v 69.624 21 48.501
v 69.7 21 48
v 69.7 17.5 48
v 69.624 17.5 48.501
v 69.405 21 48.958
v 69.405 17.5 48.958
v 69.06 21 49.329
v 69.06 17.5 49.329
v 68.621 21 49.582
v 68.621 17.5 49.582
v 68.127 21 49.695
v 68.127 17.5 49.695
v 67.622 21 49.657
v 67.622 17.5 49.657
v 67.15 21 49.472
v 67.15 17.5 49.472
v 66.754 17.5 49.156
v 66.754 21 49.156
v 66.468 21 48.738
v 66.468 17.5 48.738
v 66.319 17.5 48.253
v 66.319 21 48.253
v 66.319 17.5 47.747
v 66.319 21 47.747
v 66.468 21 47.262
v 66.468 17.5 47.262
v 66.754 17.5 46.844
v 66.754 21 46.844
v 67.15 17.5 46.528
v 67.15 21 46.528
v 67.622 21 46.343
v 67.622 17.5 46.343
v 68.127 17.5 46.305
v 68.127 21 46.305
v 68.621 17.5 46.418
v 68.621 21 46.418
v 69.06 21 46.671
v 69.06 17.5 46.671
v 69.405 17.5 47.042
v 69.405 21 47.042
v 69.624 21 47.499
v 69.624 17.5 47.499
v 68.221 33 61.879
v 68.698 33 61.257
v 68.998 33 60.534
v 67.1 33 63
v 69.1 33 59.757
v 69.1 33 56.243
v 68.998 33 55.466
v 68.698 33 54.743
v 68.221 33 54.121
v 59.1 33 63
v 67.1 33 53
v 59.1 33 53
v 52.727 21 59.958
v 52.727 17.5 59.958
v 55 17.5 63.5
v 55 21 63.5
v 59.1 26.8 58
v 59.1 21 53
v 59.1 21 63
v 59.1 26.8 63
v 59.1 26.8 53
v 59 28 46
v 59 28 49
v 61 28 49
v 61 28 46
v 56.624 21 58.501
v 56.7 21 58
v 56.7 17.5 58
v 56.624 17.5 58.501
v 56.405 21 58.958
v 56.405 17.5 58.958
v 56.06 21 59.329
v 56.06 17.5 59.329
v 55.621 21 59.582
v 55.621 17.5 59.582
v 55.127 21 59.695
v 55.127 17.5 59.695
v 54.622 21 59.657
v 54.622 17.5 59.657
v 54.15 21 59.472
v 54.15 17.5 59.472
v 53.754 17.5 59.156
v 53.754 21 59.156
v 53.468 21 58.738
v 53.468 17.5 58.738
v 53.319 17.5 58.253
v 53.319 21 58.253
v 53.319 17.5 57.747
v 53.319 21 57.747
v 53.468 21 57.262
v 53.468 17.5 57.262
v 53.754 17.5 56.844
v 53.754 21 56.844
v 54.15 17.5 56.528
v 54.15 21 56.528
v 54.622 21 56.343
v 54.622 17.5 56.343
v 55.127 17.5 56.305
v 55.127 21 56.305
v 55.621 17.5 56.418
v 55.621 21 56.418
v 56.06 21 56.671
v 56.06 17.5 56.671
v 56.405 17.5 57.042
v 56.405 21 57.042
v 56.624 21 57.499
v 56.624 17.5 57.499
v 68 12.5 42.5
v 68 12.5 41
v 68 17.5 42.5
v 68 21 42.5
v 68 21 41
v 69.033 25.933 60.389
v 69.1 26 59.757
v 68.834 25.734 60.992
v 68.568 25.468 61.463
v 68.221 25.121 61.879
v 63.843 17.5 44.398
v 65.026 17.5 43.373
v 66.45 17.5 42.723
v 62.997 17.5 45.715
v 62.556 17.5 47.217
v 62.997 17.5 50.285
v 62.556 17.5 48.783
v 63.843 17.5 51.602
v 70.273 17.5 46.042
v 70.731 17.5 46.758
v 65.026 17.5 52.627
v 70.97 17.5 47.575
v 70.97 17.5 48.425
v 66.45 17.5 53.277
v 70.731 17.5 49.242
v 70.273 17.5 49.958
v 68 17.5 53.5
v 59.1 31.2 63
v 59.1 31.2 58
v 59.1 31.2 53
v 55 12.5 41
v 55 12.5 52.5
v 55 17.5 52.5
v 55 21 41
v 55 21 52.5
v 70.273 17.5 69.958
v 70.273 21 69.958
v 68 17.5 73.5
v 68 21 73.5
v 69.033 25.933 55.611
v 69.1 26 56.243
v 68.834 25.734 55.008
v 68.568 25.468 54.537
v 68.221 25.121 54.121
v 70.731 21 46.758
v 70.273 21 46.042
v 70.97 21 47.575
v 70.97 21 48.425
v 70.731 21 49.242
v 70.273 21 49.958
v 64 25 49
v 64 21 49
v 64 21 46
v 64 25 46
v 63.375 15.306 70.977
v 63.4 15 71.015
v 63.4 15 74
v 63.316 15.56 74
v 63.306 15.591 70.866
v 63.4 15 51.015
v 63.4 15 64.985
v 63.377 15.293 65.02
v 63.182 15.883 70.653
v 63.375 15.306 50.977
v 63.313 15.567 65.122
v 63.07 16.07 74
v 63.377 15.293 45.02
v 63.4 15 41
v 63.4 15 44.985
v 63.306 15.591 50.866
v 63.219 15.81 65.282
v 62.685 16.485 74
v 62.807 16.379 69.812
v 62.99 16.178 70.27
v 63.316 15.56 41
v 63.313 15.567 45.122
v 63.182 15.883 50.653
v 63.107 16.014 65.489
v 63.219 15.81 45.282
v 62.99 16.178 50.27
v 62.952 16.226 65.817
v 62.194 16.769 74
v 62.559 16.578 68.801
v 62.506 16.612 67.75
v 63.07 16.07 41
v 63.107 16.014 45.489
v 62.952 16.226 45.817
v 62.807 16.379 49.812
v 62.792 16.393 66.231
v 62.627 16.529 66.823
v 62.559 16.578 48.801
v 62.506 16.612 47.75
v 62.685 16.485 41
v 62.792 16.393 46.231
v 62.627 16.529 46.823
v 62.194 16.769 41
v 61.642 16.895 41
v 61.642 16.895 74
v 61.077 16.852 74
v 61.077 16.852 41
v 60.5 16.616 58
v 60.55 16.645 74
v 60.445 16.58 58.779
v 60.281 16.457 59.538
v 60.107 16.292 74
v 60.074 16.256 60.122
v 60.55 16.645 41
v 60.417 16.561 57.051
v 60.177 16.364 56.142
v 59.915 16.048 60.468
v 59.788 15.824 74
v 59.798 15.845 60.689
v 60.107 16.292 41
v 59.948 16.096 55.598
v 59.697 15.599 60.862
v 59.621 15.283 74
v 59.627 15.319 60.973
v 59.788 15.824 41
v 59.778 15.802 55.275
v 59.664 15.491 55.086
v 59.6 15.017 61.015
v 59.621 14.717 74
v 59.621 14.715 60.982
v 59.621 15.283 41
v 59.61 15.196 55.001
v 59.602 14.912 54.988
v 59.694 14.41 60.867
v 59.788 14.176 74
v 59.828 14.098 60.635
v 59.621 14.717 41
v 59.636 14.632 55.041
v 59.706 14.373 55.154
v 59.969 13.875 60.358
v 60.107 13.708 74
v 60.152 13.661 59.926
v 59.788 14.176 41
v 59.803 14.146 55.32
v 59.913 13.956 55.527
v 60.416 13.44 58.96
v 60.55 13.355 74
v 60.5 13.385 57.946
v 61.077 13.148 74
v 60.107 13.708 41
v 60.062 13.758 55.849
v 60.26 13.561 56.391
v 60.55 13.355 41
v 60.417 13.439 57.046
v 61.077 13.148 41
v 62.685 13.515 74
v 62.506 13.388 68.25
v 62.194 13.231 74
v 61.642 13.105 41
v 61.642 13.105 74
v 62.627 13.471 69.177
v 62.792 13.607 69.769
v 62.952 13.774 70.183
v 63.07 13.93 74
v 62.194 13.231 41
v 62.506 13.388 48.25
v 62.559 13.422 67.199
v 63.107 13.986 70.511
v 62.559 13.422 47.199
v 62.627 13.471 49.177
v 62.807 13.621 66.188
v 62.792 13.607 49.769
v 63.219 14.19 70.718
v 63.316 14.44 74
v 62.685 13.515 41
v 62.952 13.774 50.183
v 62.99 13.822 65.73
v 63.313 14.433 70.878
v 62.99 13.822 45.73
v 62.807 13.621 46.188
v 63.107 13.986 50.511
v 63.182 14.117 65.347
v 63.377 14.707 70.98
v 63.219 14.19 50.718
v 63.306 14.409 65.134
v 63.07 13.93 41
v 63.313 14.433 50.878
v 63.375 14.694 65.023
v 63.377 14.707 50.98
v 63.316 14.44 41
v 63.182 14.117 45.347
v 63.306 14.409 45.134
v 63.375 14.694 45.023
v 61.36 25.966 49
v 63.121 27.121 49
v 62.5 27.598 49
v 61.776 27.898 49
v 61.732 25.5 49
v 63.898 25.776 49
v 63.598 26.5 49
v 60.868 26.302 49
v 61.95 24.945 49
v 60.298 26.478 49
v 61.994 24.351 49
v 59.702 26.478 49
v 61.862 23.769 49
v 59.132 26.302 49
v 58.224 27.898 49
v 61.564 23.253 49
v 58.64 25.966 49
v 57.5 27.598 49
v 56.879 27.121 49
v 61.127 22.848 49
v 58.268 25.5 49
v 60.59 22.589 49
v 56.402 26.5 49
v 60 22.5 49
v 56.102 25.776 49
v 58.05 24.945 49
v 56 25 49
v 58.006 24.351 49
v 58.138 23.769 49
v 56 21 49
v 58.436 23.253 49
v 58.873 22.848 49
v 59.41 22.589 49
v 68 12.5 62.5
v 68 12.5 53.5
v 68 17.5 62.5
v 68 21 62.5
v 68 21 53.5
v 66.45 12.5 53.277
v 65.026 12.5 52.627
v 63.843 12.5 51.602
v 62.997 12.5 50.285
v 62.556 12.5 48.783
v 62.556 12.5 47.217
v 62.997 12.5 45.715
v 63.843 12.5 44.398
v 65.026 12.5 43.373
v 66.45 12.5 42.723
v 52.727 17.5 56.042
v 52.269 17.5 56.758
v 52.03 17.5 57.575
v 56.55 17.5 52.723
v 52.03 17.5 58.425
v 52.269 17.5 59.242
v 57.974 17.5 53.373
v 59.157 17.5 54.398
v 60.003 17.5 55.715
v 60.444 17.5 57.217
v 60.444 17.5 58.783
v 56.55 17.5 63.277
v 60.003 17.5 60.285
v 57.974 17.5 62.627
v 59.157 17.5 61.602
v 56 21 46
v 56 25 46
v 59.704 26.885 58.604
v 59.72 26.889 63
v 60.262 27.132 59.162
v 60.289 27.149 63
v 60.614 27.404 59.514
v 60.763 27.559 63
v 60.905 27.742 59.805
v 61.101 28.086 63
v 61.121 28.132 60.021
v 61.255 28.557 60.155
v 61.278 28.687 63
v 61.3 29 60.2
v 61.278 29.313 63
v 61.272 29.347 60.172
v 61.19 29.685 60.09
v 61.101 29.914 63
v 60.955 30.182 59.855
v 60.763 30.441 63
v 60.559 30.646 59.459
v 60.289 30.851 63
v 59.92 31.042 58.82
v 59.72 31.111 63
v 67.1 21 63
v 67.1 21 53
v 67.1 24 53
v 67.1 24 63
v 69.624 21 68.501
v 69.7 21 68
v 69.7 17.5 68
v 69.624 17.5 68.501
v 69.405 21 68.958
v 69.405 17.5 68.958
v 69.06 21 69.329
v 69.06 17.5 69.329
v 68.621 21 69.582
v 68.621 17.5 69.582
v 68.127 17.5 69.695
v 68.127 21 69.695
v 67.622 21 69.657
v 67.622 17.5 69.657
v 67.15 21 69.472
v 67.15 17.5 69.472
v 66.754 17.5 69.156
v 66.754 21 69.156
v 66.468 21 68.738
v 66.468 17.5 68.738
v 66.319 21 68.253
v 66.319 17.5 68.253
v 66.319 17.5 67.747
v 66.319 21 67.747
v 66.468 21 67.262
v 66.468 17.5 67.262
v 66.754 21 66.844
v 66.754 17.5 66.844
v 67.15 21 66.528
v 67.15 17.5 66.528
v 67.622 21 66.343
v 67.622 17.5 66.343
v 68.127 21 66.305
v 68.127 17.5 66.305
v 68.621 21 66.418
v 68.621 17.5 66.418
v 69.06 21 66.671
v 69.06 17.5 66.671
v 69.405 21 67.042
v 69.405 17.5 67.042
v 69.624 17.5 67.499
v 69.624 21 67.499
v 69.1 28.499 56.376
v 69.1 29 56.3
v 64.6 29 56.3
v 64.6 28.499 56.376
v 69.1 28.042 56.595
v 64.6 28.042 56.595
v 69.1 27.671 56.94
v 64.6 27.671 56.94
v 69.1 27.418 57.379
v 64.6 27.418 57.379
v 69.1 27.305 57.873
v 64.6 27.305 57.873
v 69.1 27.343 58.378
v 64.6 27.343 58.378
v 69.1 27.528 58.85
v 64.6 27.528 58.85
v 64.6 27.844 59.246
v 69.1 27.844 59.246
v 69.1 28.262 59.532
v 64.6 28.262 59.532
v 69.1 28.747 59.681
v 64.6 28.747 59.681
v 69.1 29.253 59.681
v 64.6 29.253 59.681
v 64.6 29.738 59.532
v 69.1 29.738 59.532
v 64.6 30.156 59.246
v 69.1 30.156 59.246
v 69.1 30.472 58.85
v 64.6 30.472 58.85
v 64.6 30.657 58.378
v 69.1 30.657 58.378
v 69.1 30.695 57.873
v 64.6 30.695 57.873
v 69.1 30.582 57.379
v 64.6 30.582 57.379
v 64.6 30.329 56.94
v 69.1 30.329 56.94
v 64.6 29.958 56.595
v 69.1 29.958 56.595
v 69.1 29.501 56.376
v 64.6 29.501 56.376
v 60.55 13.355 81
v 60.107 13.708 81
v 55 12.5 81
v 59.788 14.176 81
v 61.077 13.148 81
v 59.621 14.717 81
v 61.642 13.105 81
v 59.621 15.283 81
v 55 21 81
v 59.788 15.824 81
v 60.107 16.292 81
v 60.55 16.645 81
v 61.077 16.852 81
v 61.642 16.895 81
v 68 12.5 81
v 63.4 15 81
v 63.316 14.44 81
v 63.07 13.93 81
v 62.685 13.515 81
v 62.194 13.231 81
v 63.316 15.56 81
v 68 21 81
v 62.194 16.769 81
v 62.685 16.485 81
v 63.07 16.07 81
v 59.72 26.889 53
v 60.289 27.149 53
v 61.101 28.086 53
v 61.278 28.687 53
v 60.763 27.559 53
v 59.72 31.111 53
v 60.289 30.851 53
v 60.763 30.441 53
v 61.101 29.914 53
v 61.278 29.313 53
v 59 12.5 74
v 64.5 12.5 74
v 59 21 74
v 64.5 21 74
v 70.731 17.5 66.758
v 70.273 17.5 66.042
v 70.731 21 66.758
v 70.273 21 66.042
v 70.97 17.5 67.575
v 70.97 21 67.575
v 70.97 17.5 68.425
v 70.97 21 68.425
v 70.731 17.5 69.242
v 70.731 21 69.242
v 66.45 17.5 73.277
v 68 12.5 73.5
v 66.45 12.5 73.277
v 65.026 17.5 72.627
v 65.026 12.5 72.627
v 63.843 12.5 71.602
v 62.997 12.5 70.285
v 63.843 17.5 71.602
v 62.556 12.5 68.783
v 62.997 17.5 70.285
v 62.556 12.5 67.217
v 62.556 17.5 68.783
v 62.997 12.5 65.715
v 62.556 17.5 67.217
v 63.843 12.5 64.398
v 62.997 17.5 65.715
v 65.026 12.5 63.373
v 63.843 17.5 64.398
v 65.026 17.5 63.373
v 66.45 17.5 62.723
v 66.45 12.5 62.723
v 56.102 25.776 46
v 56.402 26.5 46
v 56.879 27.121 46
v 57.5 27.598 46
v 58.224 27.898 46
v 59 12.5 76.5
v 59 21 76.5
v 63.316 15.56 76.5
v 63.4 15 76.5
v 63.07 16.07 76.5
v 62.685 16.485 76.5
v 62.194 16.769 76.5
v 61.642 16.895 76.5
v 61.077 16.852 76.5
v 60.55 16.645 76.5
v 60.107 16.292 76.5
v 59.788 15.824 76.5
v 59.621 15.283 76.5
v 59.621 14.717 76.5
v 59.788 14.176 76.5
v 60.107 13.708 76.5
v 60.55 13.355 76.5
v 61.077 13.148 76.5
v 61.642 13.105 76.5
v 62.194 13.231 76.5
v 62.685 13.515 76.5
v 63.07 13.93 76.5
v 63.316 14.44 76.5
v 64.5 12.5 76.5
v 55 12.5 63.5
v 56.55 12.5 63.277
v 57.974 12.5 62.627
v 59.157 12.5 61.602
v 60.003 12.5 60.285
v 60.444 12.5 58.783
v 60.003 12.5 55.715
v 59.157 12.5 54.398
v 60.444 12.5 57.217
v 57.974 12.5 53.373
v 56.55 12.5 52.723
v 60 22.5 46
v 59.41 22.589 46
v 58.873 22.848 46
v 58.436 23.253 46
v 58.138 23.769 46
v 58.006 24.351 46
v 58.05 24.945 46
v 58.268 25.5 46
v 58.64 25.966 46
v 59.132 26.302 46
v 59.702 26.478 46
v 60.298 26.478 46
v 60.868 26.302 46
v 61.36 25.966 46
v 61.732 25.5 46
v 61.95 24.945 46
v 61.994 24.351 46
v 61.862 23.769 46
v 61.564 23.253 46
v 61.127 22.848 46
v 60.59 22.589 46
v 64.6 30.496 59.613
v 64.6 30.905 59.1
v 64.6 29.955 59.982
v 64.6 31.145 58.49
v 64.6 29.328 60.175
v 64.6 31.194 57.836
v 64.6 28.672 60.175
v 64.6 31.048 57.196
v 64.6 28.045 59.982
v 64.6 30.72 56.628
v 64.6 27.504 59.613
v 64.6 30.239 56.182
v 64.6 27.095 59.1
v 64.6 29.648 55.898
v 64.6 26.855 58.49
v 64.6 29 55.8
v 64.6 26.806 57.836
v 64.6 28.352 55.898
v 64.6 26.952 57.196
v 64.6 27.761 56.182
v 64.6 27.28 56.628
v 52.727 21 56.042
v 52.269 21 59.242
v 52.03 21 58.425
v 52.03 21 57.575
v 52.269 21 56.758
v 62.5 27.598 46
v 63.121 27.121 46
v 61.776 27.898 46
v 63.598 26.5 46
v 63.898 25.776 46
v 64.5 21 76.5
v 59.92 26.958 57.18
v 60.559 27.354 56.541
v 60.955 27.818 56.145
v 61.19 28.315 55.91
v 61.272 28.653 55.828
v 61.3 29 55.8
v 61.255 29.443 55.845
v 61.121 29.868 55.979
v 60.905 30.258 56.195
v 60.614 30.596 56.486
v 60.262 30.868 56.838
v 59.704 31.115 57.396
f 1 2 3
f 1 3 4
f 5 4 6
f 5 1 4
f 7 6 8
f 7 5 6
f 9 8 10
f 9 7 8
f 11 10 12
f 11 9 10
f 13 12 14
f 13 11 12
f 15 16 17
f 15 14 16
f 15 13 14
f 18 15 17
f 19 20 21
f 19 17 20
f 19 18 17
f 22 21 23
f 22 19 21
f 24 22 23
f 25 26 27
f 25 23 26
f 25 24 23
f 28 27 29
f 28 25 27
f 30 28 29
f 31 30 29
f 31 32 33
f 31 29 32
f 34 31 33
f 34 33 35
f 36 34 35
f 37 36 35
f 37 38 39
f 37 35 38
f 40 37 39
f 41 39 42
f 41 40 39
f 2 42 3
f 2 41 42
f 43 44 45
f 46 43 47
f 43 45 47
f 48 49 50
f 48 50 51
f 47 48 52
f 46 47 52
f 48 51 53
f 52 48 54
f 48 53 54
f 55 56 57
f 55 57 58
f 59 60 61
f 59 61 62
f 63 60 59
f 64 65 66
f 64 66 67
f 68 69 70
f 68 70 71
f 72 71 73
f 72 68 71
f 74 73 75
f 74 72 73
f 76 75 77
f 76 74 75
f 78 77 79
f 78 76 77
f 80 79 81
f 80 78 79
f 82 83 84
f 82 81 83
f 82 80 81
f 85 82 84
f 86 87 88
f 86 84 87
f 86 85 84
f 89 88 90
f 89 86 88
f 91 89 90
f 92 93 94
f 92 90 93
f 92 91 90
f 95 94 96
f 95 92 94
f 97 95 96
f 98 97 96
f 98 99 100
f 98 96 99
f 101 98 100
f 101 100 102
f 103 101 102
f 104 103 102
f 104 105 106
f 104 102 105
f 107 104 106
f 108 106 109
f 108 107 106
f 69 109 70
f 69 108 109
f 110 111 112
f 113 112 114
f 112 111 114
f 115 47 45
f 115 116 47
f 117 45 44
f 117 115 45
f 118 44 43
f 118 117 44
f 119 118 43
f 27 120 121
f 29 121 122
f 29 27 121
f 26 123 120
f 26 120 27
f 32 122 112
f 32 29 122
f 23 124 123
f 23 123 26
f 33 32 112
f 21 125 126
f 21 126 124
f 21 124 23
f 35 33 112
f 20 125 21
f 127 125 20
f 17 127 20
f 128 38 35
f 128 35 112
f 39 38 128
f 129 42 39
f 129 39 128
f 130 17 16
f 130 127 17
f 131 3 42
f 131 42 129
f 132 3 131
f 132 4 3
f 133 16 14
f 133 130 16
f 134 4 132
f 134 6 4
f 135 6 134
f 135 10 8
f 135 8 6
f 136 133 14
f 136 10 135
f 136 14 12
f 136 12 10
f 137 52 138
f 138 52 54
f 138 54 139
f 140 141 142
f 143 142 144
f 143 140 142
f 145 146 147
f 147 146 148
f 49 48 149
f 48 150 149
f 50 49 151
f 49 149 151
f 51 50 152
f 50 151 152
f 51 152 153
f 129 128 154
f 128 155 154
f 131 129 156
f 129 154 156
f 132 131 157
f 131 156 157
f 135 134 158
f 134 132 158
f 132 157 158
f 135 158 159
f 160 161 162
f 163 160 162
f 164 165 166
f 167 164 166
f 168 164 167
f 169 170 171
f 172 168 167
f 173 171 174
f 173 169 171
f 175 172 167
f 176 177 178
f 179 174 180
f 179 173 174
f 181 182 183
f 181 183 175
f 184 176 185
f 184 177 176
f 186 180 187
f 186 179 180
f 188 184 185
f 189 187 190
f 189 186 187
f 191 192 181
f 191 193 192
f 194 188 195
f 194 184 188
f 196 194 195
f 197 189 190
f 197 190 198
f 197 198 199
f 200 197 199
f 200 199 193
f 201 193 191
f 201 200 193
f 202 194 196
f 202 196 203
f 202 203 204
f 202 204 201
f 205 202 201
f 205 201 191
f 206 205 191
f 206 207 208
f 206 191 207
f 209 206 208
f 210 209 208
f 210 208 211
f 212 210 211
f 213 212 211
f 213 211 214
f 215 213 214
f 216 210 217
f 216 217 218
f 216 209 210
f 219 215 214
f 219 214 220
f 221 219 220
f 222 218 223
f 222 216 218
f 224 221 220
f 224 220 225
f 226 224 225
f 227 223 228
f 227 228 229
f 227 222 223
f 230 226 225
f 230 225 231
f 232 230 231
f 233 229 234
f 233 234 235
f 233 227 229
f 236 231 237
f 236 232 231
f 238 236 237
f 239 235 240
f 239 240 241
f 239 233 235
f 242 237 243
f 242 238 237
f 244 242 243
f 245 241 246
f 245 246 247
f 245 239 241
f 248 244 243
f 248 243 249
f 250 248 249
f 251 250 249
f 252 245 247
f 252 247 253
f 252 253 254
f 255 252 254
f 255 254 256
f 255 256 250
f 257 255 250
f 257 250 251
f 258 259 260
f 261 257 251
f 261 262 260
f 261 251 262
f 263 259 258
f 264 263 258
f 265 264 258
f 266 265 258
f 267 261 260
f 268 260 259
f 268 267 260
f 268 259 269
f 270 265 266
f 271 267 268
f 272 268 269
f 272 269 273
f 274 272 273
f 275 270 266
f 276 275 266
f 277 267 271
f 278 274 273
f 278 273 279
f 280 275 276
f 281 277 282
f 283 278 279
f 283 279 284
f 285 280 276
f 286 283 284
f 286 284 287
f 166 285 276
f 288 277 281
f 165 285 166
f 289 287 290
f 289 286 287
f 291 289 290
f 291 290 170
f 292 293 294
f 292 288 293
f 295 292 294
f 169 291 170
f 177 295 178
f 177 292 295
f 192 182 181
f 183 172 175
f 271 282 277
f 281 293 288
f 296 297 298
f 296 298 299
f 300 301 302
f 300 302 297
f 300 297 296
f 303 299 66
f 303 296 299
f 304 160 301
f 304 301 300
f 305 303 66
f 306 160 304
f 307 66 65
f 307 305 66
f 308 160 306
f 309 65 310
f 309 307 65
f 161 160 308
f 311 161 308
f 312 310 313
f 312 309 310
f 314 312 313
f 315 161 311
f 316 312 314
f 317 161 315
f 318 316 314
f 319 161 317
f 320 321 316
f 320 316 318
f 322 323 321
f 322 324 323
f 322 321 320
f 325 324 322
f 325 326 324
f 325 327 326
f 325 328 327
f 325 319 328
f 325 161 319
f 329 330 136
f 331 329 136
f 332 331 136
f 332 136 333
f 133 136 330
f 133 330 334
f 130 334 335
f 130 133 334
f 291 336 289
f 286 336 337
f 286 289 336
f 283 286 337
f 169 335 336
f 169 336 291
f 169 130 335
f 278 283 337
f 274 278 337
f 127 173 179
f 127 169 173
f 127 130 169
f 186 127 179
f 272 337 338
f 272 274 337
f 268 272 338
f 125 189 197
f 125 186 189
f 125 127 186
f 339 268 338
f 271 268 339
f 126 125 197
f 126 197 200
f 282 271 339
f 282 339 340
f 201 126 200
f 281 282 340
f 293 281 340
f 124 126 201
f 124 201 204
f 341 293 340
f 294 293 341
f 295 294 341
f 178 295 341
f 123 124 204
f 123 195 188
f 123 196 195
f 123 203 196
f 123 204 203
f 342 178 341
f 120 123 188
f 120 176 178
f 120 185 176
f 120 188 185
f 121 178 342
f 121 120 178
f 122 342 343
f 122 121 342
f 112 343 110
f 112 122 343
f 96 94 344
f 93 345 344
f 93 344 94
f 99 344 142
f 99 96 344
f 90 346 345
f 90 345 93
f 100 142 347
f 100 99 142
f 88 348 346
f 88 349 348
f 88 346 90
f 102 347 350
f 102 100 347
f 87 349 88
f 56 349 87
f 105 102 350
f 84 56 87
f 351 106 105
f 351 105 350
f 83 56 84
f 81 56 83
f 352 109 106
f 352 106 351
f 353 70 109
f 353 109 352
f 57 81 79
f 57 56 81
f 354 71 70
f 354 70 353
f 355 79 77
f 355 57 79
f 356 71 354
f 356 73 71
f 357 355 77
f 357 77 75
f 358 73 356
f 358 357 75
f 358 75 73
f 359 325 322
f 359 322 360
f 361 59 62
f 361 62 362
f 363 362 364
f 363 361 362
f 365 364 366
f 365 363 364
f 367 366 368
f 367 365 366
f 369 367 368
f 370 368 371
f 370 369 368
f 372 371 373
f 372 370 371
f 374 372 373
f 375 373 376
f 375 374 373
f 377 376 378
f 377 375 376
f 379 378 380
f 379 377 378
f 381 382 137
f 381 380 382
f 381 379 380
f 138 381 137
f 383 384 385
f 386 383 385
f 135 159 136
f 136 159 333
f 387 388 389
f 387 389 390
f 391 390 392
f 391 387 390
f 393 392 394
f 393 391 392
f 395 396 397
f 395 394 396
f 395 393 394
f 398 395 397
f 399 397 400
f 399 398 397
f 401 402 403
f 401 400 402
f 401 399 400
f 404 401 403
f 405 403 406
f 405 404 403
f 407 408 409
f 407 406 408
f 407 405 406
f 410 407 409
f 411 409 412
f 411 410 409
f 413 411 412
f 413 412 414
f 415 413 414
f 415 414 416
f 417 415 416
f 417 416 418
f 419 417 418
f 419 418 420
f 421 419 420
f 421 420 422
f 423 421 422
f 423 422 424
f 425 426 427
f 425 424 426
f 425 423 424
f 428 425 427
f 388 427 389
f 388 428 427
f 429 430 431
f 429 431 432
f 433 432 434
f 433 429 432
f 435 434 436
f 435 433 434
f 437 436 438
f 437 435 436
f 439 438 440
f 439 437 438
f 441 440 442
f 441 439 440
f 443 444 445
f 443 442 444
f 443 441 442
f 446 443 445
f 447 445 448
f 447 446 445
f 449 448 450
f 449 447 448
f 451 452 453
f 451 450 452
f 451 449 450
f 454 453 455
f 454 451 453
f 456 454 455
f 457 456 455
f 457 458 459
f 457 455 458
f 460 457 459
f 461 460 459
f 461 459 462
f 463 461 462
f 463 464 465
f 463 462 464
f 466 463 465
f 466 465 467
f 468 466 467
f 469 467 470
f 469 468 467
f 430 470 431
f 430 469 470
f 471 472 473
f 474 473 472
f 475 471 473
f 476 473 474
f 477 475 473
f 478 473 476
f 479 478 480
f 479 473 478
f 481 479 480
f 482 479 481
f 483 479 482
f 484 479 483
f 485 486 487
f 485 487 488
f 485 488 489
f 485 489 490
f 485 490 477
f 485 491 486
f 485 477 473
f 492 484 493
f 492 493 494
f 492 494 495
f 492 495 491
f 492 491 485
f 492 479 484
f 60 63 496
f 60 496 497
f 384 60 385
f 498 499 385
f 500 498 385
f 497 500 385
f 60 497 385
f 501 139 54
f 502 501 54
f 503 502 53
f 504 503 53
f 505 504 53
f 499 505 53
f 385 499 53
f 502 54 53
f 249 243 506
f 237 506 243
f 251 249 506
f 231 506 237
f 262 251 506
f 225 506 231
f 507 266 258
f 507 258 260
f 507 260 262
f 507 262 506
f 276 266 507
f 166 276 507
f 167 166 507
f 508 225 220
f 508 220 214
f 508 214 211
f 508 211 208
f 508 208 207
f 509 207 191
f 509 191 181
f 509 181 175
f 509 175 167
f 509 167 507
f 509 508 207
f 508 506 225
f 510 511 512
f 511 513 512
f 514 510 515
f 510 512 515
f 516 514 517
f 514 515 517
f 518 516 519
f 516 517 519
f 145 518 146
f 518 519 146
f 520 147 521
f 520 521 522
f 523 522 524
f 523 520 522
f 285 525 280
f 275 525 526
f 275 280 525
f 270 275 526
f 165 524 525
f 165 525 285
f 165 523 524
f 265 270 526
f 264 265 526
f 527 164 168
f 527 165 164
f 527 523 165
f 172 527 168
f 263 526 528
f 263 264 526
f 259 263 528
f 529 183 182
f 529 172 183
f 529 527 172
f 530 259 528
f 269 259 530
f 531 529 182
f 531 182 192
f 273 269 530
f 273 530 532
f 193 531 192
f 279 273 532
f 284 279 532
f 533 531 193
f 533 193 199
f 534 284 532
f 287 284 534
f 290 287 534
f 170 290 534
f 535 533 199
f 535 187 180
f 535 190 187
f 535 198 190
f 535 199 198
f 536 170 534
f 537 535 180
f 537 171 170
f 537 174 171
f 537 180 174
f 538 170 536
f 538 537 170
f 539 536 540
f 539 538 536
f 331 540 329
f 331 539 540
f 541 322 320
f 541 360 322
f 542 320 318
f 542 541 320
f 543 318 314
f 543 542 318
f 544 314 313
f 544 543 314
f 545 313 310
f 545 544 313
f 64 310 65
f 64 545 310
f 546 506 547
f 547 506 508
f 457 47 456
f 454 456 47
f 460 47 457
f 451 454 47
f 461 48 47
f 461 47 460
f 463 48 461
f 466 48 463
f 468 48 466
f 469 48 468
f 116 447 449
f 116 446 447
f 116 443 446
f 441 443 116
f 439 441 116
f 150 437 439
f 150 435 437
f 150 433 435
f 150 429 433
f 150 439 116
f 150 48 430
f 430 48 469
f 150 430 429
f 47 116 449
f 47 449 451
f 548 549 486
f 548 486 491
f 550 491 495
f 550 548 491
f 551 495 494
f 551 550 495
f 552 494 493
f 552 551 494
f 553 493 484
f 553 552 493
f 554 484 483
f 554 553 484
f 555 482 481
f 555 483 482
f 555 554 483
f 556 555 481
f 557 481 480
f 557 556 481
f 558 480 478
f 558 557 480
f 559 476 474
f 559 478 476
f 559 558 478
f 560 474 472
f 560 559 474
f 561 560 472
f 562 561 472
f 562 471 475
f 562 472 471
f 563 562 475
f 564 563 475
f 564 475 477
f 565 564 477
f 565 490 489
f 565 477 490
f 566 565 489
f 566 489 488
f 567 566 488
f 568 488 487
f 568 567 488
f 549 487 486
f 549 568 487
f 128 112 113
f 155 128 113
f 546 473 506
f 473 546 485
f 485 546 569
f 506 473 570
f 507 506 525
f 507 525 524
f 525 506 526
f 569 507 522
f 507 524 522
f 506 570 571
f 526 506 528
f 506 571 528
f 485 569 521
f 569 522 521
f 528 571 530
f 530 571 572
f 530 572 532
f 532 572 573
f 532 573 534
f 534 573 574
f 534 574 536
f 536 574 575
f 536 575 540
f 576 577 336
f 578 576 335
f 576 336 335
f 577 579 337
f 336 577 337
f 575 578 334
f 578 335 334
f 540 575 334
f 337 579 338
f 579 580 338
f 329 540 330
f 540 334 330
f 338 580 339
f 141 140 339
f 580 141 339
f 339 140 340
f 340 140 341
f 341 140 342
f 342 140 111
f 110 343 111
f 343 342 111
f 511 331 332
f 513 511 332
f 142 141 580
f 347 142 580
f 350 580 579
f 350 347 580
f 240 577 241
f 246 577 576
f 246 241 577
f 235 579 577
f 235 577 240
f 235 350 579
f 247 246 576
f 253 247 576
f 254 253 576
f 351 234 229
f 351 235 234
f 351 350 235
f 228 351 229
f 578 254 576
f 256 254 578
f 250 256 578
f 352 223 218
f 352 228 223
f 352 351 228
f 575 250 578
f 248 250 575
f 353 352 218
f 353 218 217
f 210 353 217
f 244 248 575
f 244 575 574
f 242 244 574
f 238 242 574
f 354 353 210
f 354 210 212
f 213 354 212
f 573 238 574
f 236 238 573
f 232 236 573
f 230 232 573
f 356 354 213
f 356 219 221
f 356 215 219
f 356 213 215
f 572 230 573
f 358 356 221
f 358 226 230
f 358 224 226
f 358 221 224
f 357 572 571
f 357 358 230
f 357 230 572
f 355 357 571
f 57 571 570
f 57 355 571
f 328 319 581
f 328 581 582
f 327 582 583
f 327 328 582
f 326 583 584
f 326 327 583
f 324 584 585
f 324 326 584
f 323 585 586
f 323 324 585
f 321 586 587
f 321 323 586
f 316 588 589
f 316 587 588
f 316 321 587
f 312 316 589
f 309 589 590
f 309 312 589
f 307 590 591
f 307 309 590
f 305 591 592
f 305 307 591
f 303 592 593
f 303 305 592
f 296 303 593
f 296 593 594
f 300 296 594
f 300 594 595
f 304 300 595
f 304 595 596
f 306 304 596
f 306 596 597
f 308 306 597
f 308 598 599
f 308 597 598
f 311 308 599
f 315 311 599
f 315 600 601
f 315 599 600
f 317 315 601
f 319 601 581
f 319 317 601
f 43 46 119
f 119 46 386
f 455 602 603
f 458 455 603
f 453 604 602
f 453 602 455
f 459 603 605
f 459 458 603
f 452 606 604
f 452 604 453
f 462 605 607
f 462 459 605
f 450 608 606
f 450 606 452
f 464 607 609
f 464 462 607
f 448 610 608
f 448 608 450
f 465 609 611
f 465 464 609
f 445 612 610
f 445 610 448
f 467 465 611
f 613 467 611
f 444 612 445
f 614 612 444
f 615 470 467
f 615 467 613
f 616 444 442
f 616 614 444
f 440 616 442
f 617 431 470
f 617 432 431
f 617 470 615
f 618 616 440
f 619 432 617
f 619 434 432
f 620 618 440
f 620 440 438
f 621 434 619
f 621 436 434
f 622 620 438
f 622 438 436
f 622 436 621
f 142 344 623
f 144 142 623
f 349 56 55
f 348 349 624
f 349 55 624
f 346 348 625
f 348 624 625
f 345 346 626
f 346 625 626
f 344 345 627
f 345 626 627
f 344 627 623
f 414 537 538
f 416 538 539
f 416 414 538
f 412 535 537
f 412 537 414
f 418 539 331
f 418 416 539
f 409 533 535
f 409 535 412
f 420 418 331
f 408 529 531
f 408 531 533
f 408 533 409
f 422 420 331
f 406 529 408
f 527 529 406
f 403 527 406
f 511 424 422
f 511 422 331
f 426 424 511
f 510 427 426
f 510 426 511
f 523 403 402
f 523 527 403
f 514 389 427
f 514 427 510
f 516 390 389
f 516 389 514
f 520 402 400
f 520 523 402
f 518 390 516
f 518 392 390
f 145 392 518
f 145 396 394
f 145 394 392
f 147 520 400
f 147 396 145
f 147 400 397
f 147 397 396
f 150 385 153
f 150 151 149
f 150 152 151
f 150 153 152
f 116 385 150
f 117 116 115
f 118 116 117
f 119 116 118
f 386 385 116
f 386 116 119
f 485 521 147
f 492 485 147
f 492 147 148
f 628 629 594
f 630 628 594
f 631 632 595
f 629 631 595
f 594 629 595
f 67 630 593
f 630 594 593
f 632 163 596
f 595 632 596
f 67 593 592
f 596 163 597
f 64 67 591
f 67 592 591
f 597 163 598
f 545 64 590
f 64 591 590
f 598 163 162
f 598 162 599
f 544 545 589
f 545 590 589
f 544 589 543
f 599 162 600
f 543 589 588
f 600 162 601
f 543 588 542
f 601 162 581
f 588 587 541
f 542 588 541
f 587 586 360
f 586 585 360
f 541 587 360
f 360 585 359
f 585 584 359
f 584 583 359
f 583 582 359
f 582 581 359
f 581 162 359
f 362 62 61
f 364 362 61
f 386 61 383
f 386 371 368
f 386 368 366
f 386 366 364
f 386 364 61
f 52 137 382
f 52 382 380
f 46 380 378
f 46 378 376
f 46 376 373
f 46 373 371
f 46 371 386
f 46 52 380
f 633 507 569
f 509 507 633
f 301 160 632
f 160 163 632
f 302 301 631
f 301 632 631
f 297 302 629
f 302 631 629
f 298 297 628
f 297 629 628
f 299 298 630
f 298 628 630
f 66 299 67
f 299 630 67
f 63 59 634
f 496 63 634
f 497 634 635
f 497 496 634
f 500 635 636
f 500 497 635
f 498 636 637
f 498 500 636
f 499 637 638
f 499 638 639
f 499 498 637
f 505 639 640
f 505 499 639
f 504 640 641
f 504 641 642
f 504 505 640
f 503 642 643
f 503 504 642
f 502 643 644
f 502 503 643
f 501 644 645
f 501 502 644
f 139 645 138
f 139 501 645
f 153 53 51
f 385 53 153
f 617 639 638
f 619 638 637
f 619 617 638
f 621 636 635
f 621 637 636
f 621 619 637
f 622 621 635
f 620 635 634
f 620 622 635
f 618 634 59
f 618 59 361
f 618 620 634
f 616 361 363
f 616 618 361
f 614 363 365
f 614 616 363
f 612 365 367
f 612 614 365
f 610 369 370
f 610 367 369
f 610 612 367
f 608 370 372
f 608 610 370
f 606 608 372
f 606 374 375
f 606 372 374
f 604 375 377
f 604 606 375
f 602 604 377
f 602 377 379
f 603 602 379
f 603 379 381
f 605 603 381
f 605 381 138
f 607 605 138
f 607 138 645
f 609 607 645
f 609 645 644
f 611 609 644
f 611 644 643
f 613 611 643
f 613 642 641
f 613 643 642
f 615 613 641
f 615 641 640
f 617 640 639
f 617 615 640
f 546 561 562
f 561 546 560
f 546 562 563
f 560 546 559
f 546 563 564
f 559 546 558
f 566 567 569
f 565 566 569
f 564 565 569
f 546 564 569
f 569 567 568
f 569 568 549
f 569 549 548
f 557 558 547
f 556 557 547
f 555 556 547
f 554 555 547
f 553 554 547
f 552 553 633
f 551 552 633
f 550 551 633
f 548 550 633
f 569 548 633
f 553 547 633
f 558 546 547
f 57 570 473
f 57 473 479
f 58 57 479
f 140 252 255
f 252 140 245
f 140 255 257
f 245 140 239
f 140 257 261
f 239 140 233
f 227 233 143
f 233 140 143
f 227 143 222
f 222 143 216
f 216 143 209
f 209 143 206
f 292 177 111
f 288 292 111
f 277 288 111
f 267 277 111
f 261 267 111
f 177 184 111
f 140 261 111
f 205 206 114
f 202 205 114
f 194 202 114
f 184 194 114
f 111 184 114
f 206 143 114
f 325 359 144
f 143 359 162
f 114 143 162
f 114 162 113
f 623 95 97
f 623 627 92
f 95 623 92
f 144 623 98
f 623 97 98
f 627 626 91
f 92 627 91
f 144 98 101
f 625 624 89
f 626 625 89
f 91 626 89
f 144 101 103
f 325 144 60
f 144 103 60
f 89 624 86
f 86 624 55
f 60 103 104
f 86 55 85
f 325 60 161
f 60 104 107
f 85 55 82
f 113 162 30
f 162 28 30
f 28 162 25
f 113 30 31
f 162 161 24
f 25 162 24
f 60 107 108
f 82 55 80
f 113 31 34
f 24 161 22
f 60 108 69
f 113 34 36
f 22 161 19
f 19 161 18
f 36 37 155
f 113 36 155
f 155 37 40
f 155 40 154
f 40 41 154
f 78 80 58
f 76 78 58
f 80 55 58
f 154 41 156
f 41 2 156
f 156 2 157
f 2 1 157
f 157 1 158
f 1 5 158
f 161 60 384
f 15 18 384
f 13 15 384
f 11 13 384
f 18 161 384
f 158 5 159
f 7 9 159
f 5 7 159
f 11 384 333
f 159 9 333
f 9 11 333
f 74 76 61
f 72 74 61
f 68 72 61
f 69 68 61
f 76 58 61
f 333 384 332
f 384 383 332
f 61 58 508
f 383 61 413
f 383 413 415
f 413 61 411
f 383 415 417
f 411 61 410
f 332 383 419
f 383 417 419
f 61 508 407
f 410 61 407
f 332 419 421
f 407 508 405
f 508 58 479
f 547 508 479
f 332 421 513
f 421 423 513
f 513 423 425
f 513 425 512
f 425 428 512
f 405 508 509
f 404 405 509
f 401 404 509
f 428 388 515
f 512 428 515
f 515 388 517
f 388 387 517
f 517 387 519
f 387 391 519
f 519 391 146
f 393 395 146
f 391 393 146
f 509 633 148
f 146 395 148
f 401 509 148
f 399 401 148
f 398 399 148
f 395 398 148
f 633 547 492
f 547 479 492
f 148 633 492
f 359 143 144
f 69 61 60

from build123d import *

# Parameters (mm, degrees)
BOX001027045206_W       = 8
BOX001027045206_H       = 6
BOX001027045206_DEPTH   = 10
CYLINDER272_R           = 2.2
CYLINDER272_DEPTH       = 30
CYLINDER271_R           = 2.2
CYLINDER271_DEPTH       = 30
CYLINDER271_PITCH_ANGLE = 90
CYLINDER270_R           = 1.7
CYLINDER270_DEPTH       = 30
CYLINDER270_PITCH_ANGLE = 90
BOX001027045200_W       = 10
BOX001027045200_H       = 9
BOX001027045200_DEPTH   = 10
CHAMFER015_SIZE         = 2
CHAMFER016_SIZE         = 2
FILLET046_R             = 3
CYLINDER045_R           = 1.9
CYLINDER045_DEPTH       = 200
BOX030_W                = 5.5
BOX030_H                = 10
BOX030_DEPTH            = 2.5
CYLINDER048_R           = 5.5
CYLINDER048_DEPTH       = 10
CYLINDER048_ROLL_ANGLE  = 90
CYLINDER050_R           = 5.5
CYLINDER050_DEPTH       = 10
CYLINDER050_ROLL_ANGLE  = 90
CYLINDER052_R           = 1.7
CYLINDER052_DEPTH       = 30
CYLINDER052_ROLL_ANGLE  = 90
CYLINDER053_R           = 1.7
CYLINDER053_DEPTH       = 30
CYLINDER053_ROLL_ANGLE  = 90
CYLINDER054_R           = 1.7
CYLINDER054_DEPTH       = 30
CYLINDER054_ROLL_ANGLE  = 90
CYLINDER047_R           = 5.5
CYLINDER047_DEPTH       = 10
CYLINDER047_ROLL_ANGLE  = 90
CYLINDER049_R           = 3
CYLINDER049_DEPTH       = 10
CYLINDER049_ROLL_ANGLE  = 90
CYLINDER051_R           = 3
CYLINDER051_DEPTH       = 10
CYLINDER051_ROLL_ANGLE  = 90
CYLINDER046_R           = 3
CYLINDER046_DEPTH       = 10
CYLINDER046_ROLL_ANGLE  = 90
BOX028_W                = 13
BOX028_H                = 8.5
BOX028_DEPTH            = 40
CHAMFER006_SIZE         = 2.5
CYLINDER273_R           = 2
CYLINDER273_DEPTH       = 10
CYLINDER273_PITCH_ANGLE = 90
BOX001027045201_W       = 3
BOX001027045201_H       = 8
BOX001027045201_DEPTH   = 8
FILLET047_R             = 3
CUT247_PITCH_ANGLE      = 90
CUT247_PLACEMENT_ANGLE  = 90


with BuildPart() as cube252:
    # Box001027045206 → Box001027045206 (new body)
    with BuildSketch(Plane(origin=(59.1, 20, 53), x_dir=(1, 0, 0), z_dir=(0, 0, 1))):
        with Locations((4, 3)):
            Rectangle(BOX001027045206_W, BOX001027045206_H)
    extrude(amount=BOX001027045206_DEPTH)


with BuildPart() as cylinder288:
    # Cylinder272 → Cylinder272 (new body)
    with BuildSketch(Plane(origin=(79.5, 5, 48), x_dir=(1, 0, 0), z_dir=(0, 0, 1))):
        Circle(CYLINDER272_R)
    extrude(amount=CYLINDER272_DEPTH)


with BuildPart() as cylinder287:
    # Cylinder271 → Cylinder271 (new body)
    with BuildSketch(Plane.XY):
        Circle(CYLINDER271_R)
    extrude(amount=CYLINDER271_DEPTH)


with BuildPart() as cylinder287_1:
    # Cylinder271 pitch: moved
    add(cylinder287.part.rotate(Axis((0, 0, 0), (0, 1, 0)), CYLINDER271_PITCH_ANGLE))


with BuildPart() as cylinder287_2:
    # Cylinder271 placement: moved
    add(cylinder287_1.part.moved(Location((74, 5, 58))))


with BuildPart() as cylinder286:
    # Cylinder270 → Cylinder270 (new body)
    with BuildSketch(Plane.XY):
        Circle(CYLINDER270_R)
    extrude(amount=CYLINDER270_DEPTH)


with BuildPart() as cylinder286_1:
    # Cylinder270 pitch: moved
    add(cylinder286.part.rotate(Axis((0, 0, 0), (0, 1, 0)), CYLINDER270_PITCH_ANGLE))


with BuildPart() as cylinder286_2:
    # Cylinder270 placement: moved
    add(cylinder286_1.part.moved(Location((57, 5, 58))))


with BuildPart() as led_pt_holder001:
    # Box001027045200 → Box001027045200 (new body)
    with BuildSketch(Plane(origin=(71, 1, 53), x_dir=(1, 0, 0), z_dir=(0, 0, 1))):
        with Locations((5, 4.5)):
            Rectangle(BOX001027045200_W, BOX001027045200_H)
    extrude(amount=BOX001027045200_DEPTH)

    # Chamfer015
    chamfer015_edges = [led_pt_holder001.edges().sort_by_distance(p)[0] for p in [
        (71, 10, 58),
    ]]
    chamfer(chamfer015_edges, length=CHAMFER015_SIZE)


with BuildPart() as led_pt_holder001_1:
    # Chamfer015 placement: moved
    add(led_pt_holder001.part.moved(Location((-1.5, 0, 0))))

    # Chamfer016
    chamfer016_edges = [led_pt_holder001_1.edges().sort_by_distance(p)[0] for p in [
        (69.5, 4.5, 63),
        (69.5, 4.5, 53),
    ]]
    chamfer(chamfer016_edges, length=CHAMFER016_SIZE)

    # Cut242: cut Cylinder286
    add(cylinder286_2.part, mode=Mode.SUBTRACT)

    # Cut243: cut Cylinder287
    add(cylinder287_2.part, mode=Mode.SUBTRACT)

    # Fillet046
    fillet046_edges = [led_pt_holder001_1.edges().sort_by_distance(p)[0] for p in [
        (69.5, 4.5, 55),
        (69.5, 4.5, 61),
    ]]
    fillet(fillet046_edges, radius=FILLET046_R)

    # Cut245: cut Cylinder288
    add(cylinder288.part, mode=Mode.SUBTRACT)


with BuildPart() as part_mirroring015:
    # Part__Mirroring015: instance of led-pt-holder001
    add(led_pt_holder001_1.part.mirror(Plane(origin=(60, 0, 0), x_dir=(0, -1, 0), z_dir=(1, 0, 0))))


with BuildPart() as part_mirroring015_1:
    # Part__Mirroring015 placement: moved
    add(part_mirroring015.part.moved(Location((18.6, 0, 0))))


with BuildPart() as pt_holder:
    # Part__Mirroring019: instance of Part__Mirroring015
    add(part_mirroring015_1.part.mirror(Plane(origin=(0, 0, 0), x_dir=(1, 0, 0), z_dir=(0, 1, 0))))


with BuildPart() as pt_holder_1:
    # Part__Mirroring019 placement: moved
    add(pt_holder.part.moved(Location((0, 34, 0))))

    # Fusion112161: union Cube252
    add(cube252.part)


with BuildPart() as m3_studding004:
    # Cylinder045 → Cylinder045 (new body)
    with BuildSketch(Plane(origin=(61.5, 15, 2), x_dir=(1, 0, 0), z_dir=(0, 0, 1))):
        Circle(CYLINDER045_R)
    extrude(amount=CYLINDER045_DEPTH)


with BuildPart() as m3_nut_hole:
    # Box030 → Box030 (new body)
    with BuildSketch(Plane(origin=(59, 11.7, 74), x_dir=(1, 0, 0), z_dir=(0, 0, 1))):
        with Locations((2.75, 5)):
            Rectangle(BOX030_W, BOX030_H)
    extrude(amount=BOX030_DEPTH)


with BuildPart() as cylinder088:
    # Cylinder048 → Cylinder048 (new body)
    with BuildSketch(Plane.XY):
        Circle(CYLINDER048_R)
    extrude(amount=CYLINDER048_DEPTH)


with BuildPart() as cylinder088_1:
    # Cylinder048 roll: moved
    add(cylinder088.part.rotate(Axis((0, 0, 0), (1, 0, 0)), CYLINDER048_ROLL_ANGLE))


with BuildPart() as cylinder088_2:
    # Cylinder048 placement: moved
    add(cylinder088_1.part.moved(Location((68, 17.5, 68))))


with BuildPart() as cylinder090:
    # Cylinder050 → Cylinder050 (new body)
    with BuildSketch(Plane.XY):
        Circle(CYLINDER050_R)
    extrude(amount=CYLINDER050_DEPTH)


with BuildPart() as cylinder090_1:
    # Cylinder050 roll: moved
    add(cylinder090.part.rotate(Axis((0, 0, 0), (1, 0, 0)), CYLINDER050_ROLL_ANGLE))


with BuildPart() as cylinder090_2:
    # Cylinder050 placement: moved
    add(cylinder090_1.part.moved(Location((68, 17.5, 48))))


with BuildPart() as cylinder092:
    # Cylinder052 → Cylinder052 (new body)
    with BuildSketch(Plane.XY):
        Circle(CYLINDER052_R)
    extrude(amount=CYLINDER052_DEPTH)


with BuildPart() as cylinder092_1:
    # Cylinder052 roll: moved
    add(cylinder092.part.rotate(Axis((0, 0, 0), (1, 0, 0)), CYLINDER052_ROLL_ANGLE))


with BuildPart() as cylinder092_2:
    # Cylinder052 placement: moved
    add(cylinder092_1.part.moved(Location((68, 26, 48))))


with BuildPart() as cylinder052:
    # Cylinder053 → Cylinder053 (new body)
    with BuildSketch(Plane.XY):
        Circle(CYLINDER053_R)
    extrude(amount=CYLINDER053_DEPTH)


with BuildPart() as cylinder052_1:
    # Cylinder053 roll: moved
    add(cylinder052.part.rotate(Axis((0, 0, 0), (1, 0, 0)), CYLINDER053_ROLL_ANGLE))


with BuildPart() as cylinder052_2:
    # Cylinder053 placement: moved
    add(cylinder052_1.part.moved(Location((68, 27, 68))))


with BuildPart() as cylinder093:
    # Cylinder054 → Cylinder054 (new body)
    with BuildSketch(Plane.XY):
        Circle(CYLINDER054_R)
    extrude(amount=CYLINDER054_DEPTH)


with BuildPart() as cylinder093_1:
    # Cylinder054 roll: moved
    add(cylinder093.part.rotate(Axis((0, 0, 0), (1, 0, 0)), CYLINDER054_ROLL_ANGLE))


with BuildPart() as cylinder093_2:
    # Cylinder054 placement: moved
    add(cylinder093_1.part.moved(Location((55, 26, 58))))


with BuildPart() as trolley_clearances_and_screws:
    # Cylinder047 → Cylinder047 (new body)
    with BuildSketch(Plane.XY):
        Circle(CYLINDER047_R)
    extrude(amount=CYLINDER047_DEPTH)


with BuildPart() as trolley_clearances_and_screws_1:
    # Cylinder047 roll: moved
    add(trolley_clearances_and_screws.part.rotate(Axis((0, 0, 0), (1, 0, 0)), CYLINDER047_ROLL_ANGLE))


with BuildPart() as trolley_clearances_and_screws_2:
    # Cylinder047 placement: moved
    add(trolley_clearances_and_screws_1.part.moved(Location((55, 17.5, 58))))

    # Fusion028: union Cylinder088, Cylinder090, Cylinder092, Cylinder052, Cylinder093
    add(cylinder088_2.part)
    add(cylinder090_2.part)
    add(cylinder092_2.part)
    add(cylinder052_2.part)
    add(cylinder093_2.part)


with BuildPart() as cylinder089:
    # Cylinder049 → Cylinder049 (new body)
    with BuildSketch(Plane.XY):
        Circle(CYLINDER049_R)
    extrude(amount=CYLINDER049_DEPTH)


with BuildPart() as cylinder089_1:
    # Cylinder049 roll: moved
    add(cylinder089.part.rotate(Axis((0, 0, 0), (1, 0, 0)), CYLINDER049_ROLL_ANGLE))


with BuildPart() as cylinder089_2:
    # Cylinder049 placement: moved
    add(cylinder089_1.part.moved(Location((68, 21, 68))))


with BuildPart() as cylinder091:
    # Cylinder051 → Cylinder051 (new body)
    with BuildSketch(Plane.XY):
        Circle(CYLINDER051_R)
    extrude(amount=CYLINDER051_DEPTH)


with BuildPart() as cylinder091_1:
    # Cylinder051 roll: moved
    add(cylinder091.part.rotate(Axis((0, 0, 0), (1, 0, 0)), CYLINDER051_ROLL_ANGLE))


with BuildPart() as cylinder091_2:
    # Cylinder051 placement: moved
    add(cylinder091_1.part.moved(Location((68, 21, 48))))


with BuildPart() as trolley_hubs:
    # Cylinder046 → Cylinder046 (new body)
    with BuildSketch(Plane.XY):
        Circle(CYLINDER046_R)
    extrude(amount=CYLINDER046_DEPTH)


with BuildPart() as trolley_hubs_1:
    # Cylinder046 roll: moved
    add(trolley_hubs.part.rotate(Axis((0, 0, 0), (1, 0, 0)), CYLINDER046_ROLL_ANGLE))


with BuildPart() as trolley_hubs_2:
    # Cylinder046 placement: moved
    add(trolley_hubs_1.part.moved(Location((55, 21, 58))))

    # Fusion027: union Cylinder089, Cylinder091
    add(cylinder089_2.part)
    add(cylinder091_2.part)


with BuildPart() as trolley_b001:
    # Box028 → Box028 (new body)
    with BuildSketch(Plane(origin=(55, 12.5, 41), x_dir=(1, 0, 0), z_dir=(0, 0, 1))):
        with Locations((6.5, 4.25)):
            Rectangle(BOX028_W, BOX028_H)
    extrude(amount=BOX028_DEPTH)

    # Fusion029: union trolley-hubs
    add(trolley_hubs_2.part)

    # Cut017: cut trolley-clearances-and-screws
    add(trolley_clearances_and_screws_2.part, mode=Mode.SUBTRACT)

    # Cut019: cut M3-nut-hole
    add(m3_nut_hole.part, mode=Mode.SUBTRACT)

    # Chamfer006
    chamfer006_edges = [trolley_b001.edges().sort_by_distance(p)[0] for p in [
        (55, 19.25, 55),
        (68, 19.25, 45),
        (55, 19.25, 61),
        (68, 19.25, 65),
        (68, 19.25, 51),
        (68, 19.25, 71),
    ]]
    chamfer(chamfer006_edges, length=CHAMFER006_SIZE)

    # Cut033: cut m3-studding004
    add(m3_studding004.part, mode=Mode.SUBTRACT)


with BuildPart() as cylinder289:
    # Cylinder273 → Cylinder273 (new body)
    with BuildSketch(Plane.XY):
        Circle(CYLINDER273_R)
    extrude(amount=CYLINDER273_DEPTH)


with BuildPart() as cylinder289_1:
    # Cylinder273 pitch: moved
    add(cylinder289.part.rotate(Axis((0, 0, 0), (0, 1, 0)), CYLINDER273_PITCH_ANGLE))


with BuildPart() as cylinder289_2:
    # Cylinder273 placement: moved
    add(cylinder289_1.part.moved(Location((-3, 4, 4.5))))


with BuildPart() as trolley:
    # Box001027045201 → Box001027045201 (new body)
    with BuildSketch(Plane.XY):
        with Locations((1.5, 4)):
            Rectangle(BOX001027045201_W, BOX001027045201_H)
    extrude(amount=BOX001027045201_DEPTH)

    # Fillet047
    fillet047_edges = [trolley.edges().sort_by_distance(p)[0] for p in [
        (1.5, 0, 8),
        (1.5, 8, 8),
    ]]
    fillet(fillet047_edges, radius=FILLET047_R)

    # Cut247: cut Cylinder289
    add(cylinder289_2.part, mode=Mode.SUBTRACT)


with BuildPart() as trolley_1:
    # Cut247 pitch: moved
    add(trolley.part.rotate(Axis((0, 0, 0), (0, 1, 0)), CUT247_PITCH_ANGLE))


with BuildPart() as trolley_2:
    # Cut247 placement: moved
    add(trolley_1.part.moved(Location((64, 20, 49))).rotate(Axis((64, 20, 49), (0, 0, 1)), CUT247_PLACEMENT_ANGLE))

    # Fusion112159: union trolley-b001
    add(trolley_b001.part)

    # Fusion112164: union pt-holder
    add(pt_holder_1.part)


solid = trolley_2.part
